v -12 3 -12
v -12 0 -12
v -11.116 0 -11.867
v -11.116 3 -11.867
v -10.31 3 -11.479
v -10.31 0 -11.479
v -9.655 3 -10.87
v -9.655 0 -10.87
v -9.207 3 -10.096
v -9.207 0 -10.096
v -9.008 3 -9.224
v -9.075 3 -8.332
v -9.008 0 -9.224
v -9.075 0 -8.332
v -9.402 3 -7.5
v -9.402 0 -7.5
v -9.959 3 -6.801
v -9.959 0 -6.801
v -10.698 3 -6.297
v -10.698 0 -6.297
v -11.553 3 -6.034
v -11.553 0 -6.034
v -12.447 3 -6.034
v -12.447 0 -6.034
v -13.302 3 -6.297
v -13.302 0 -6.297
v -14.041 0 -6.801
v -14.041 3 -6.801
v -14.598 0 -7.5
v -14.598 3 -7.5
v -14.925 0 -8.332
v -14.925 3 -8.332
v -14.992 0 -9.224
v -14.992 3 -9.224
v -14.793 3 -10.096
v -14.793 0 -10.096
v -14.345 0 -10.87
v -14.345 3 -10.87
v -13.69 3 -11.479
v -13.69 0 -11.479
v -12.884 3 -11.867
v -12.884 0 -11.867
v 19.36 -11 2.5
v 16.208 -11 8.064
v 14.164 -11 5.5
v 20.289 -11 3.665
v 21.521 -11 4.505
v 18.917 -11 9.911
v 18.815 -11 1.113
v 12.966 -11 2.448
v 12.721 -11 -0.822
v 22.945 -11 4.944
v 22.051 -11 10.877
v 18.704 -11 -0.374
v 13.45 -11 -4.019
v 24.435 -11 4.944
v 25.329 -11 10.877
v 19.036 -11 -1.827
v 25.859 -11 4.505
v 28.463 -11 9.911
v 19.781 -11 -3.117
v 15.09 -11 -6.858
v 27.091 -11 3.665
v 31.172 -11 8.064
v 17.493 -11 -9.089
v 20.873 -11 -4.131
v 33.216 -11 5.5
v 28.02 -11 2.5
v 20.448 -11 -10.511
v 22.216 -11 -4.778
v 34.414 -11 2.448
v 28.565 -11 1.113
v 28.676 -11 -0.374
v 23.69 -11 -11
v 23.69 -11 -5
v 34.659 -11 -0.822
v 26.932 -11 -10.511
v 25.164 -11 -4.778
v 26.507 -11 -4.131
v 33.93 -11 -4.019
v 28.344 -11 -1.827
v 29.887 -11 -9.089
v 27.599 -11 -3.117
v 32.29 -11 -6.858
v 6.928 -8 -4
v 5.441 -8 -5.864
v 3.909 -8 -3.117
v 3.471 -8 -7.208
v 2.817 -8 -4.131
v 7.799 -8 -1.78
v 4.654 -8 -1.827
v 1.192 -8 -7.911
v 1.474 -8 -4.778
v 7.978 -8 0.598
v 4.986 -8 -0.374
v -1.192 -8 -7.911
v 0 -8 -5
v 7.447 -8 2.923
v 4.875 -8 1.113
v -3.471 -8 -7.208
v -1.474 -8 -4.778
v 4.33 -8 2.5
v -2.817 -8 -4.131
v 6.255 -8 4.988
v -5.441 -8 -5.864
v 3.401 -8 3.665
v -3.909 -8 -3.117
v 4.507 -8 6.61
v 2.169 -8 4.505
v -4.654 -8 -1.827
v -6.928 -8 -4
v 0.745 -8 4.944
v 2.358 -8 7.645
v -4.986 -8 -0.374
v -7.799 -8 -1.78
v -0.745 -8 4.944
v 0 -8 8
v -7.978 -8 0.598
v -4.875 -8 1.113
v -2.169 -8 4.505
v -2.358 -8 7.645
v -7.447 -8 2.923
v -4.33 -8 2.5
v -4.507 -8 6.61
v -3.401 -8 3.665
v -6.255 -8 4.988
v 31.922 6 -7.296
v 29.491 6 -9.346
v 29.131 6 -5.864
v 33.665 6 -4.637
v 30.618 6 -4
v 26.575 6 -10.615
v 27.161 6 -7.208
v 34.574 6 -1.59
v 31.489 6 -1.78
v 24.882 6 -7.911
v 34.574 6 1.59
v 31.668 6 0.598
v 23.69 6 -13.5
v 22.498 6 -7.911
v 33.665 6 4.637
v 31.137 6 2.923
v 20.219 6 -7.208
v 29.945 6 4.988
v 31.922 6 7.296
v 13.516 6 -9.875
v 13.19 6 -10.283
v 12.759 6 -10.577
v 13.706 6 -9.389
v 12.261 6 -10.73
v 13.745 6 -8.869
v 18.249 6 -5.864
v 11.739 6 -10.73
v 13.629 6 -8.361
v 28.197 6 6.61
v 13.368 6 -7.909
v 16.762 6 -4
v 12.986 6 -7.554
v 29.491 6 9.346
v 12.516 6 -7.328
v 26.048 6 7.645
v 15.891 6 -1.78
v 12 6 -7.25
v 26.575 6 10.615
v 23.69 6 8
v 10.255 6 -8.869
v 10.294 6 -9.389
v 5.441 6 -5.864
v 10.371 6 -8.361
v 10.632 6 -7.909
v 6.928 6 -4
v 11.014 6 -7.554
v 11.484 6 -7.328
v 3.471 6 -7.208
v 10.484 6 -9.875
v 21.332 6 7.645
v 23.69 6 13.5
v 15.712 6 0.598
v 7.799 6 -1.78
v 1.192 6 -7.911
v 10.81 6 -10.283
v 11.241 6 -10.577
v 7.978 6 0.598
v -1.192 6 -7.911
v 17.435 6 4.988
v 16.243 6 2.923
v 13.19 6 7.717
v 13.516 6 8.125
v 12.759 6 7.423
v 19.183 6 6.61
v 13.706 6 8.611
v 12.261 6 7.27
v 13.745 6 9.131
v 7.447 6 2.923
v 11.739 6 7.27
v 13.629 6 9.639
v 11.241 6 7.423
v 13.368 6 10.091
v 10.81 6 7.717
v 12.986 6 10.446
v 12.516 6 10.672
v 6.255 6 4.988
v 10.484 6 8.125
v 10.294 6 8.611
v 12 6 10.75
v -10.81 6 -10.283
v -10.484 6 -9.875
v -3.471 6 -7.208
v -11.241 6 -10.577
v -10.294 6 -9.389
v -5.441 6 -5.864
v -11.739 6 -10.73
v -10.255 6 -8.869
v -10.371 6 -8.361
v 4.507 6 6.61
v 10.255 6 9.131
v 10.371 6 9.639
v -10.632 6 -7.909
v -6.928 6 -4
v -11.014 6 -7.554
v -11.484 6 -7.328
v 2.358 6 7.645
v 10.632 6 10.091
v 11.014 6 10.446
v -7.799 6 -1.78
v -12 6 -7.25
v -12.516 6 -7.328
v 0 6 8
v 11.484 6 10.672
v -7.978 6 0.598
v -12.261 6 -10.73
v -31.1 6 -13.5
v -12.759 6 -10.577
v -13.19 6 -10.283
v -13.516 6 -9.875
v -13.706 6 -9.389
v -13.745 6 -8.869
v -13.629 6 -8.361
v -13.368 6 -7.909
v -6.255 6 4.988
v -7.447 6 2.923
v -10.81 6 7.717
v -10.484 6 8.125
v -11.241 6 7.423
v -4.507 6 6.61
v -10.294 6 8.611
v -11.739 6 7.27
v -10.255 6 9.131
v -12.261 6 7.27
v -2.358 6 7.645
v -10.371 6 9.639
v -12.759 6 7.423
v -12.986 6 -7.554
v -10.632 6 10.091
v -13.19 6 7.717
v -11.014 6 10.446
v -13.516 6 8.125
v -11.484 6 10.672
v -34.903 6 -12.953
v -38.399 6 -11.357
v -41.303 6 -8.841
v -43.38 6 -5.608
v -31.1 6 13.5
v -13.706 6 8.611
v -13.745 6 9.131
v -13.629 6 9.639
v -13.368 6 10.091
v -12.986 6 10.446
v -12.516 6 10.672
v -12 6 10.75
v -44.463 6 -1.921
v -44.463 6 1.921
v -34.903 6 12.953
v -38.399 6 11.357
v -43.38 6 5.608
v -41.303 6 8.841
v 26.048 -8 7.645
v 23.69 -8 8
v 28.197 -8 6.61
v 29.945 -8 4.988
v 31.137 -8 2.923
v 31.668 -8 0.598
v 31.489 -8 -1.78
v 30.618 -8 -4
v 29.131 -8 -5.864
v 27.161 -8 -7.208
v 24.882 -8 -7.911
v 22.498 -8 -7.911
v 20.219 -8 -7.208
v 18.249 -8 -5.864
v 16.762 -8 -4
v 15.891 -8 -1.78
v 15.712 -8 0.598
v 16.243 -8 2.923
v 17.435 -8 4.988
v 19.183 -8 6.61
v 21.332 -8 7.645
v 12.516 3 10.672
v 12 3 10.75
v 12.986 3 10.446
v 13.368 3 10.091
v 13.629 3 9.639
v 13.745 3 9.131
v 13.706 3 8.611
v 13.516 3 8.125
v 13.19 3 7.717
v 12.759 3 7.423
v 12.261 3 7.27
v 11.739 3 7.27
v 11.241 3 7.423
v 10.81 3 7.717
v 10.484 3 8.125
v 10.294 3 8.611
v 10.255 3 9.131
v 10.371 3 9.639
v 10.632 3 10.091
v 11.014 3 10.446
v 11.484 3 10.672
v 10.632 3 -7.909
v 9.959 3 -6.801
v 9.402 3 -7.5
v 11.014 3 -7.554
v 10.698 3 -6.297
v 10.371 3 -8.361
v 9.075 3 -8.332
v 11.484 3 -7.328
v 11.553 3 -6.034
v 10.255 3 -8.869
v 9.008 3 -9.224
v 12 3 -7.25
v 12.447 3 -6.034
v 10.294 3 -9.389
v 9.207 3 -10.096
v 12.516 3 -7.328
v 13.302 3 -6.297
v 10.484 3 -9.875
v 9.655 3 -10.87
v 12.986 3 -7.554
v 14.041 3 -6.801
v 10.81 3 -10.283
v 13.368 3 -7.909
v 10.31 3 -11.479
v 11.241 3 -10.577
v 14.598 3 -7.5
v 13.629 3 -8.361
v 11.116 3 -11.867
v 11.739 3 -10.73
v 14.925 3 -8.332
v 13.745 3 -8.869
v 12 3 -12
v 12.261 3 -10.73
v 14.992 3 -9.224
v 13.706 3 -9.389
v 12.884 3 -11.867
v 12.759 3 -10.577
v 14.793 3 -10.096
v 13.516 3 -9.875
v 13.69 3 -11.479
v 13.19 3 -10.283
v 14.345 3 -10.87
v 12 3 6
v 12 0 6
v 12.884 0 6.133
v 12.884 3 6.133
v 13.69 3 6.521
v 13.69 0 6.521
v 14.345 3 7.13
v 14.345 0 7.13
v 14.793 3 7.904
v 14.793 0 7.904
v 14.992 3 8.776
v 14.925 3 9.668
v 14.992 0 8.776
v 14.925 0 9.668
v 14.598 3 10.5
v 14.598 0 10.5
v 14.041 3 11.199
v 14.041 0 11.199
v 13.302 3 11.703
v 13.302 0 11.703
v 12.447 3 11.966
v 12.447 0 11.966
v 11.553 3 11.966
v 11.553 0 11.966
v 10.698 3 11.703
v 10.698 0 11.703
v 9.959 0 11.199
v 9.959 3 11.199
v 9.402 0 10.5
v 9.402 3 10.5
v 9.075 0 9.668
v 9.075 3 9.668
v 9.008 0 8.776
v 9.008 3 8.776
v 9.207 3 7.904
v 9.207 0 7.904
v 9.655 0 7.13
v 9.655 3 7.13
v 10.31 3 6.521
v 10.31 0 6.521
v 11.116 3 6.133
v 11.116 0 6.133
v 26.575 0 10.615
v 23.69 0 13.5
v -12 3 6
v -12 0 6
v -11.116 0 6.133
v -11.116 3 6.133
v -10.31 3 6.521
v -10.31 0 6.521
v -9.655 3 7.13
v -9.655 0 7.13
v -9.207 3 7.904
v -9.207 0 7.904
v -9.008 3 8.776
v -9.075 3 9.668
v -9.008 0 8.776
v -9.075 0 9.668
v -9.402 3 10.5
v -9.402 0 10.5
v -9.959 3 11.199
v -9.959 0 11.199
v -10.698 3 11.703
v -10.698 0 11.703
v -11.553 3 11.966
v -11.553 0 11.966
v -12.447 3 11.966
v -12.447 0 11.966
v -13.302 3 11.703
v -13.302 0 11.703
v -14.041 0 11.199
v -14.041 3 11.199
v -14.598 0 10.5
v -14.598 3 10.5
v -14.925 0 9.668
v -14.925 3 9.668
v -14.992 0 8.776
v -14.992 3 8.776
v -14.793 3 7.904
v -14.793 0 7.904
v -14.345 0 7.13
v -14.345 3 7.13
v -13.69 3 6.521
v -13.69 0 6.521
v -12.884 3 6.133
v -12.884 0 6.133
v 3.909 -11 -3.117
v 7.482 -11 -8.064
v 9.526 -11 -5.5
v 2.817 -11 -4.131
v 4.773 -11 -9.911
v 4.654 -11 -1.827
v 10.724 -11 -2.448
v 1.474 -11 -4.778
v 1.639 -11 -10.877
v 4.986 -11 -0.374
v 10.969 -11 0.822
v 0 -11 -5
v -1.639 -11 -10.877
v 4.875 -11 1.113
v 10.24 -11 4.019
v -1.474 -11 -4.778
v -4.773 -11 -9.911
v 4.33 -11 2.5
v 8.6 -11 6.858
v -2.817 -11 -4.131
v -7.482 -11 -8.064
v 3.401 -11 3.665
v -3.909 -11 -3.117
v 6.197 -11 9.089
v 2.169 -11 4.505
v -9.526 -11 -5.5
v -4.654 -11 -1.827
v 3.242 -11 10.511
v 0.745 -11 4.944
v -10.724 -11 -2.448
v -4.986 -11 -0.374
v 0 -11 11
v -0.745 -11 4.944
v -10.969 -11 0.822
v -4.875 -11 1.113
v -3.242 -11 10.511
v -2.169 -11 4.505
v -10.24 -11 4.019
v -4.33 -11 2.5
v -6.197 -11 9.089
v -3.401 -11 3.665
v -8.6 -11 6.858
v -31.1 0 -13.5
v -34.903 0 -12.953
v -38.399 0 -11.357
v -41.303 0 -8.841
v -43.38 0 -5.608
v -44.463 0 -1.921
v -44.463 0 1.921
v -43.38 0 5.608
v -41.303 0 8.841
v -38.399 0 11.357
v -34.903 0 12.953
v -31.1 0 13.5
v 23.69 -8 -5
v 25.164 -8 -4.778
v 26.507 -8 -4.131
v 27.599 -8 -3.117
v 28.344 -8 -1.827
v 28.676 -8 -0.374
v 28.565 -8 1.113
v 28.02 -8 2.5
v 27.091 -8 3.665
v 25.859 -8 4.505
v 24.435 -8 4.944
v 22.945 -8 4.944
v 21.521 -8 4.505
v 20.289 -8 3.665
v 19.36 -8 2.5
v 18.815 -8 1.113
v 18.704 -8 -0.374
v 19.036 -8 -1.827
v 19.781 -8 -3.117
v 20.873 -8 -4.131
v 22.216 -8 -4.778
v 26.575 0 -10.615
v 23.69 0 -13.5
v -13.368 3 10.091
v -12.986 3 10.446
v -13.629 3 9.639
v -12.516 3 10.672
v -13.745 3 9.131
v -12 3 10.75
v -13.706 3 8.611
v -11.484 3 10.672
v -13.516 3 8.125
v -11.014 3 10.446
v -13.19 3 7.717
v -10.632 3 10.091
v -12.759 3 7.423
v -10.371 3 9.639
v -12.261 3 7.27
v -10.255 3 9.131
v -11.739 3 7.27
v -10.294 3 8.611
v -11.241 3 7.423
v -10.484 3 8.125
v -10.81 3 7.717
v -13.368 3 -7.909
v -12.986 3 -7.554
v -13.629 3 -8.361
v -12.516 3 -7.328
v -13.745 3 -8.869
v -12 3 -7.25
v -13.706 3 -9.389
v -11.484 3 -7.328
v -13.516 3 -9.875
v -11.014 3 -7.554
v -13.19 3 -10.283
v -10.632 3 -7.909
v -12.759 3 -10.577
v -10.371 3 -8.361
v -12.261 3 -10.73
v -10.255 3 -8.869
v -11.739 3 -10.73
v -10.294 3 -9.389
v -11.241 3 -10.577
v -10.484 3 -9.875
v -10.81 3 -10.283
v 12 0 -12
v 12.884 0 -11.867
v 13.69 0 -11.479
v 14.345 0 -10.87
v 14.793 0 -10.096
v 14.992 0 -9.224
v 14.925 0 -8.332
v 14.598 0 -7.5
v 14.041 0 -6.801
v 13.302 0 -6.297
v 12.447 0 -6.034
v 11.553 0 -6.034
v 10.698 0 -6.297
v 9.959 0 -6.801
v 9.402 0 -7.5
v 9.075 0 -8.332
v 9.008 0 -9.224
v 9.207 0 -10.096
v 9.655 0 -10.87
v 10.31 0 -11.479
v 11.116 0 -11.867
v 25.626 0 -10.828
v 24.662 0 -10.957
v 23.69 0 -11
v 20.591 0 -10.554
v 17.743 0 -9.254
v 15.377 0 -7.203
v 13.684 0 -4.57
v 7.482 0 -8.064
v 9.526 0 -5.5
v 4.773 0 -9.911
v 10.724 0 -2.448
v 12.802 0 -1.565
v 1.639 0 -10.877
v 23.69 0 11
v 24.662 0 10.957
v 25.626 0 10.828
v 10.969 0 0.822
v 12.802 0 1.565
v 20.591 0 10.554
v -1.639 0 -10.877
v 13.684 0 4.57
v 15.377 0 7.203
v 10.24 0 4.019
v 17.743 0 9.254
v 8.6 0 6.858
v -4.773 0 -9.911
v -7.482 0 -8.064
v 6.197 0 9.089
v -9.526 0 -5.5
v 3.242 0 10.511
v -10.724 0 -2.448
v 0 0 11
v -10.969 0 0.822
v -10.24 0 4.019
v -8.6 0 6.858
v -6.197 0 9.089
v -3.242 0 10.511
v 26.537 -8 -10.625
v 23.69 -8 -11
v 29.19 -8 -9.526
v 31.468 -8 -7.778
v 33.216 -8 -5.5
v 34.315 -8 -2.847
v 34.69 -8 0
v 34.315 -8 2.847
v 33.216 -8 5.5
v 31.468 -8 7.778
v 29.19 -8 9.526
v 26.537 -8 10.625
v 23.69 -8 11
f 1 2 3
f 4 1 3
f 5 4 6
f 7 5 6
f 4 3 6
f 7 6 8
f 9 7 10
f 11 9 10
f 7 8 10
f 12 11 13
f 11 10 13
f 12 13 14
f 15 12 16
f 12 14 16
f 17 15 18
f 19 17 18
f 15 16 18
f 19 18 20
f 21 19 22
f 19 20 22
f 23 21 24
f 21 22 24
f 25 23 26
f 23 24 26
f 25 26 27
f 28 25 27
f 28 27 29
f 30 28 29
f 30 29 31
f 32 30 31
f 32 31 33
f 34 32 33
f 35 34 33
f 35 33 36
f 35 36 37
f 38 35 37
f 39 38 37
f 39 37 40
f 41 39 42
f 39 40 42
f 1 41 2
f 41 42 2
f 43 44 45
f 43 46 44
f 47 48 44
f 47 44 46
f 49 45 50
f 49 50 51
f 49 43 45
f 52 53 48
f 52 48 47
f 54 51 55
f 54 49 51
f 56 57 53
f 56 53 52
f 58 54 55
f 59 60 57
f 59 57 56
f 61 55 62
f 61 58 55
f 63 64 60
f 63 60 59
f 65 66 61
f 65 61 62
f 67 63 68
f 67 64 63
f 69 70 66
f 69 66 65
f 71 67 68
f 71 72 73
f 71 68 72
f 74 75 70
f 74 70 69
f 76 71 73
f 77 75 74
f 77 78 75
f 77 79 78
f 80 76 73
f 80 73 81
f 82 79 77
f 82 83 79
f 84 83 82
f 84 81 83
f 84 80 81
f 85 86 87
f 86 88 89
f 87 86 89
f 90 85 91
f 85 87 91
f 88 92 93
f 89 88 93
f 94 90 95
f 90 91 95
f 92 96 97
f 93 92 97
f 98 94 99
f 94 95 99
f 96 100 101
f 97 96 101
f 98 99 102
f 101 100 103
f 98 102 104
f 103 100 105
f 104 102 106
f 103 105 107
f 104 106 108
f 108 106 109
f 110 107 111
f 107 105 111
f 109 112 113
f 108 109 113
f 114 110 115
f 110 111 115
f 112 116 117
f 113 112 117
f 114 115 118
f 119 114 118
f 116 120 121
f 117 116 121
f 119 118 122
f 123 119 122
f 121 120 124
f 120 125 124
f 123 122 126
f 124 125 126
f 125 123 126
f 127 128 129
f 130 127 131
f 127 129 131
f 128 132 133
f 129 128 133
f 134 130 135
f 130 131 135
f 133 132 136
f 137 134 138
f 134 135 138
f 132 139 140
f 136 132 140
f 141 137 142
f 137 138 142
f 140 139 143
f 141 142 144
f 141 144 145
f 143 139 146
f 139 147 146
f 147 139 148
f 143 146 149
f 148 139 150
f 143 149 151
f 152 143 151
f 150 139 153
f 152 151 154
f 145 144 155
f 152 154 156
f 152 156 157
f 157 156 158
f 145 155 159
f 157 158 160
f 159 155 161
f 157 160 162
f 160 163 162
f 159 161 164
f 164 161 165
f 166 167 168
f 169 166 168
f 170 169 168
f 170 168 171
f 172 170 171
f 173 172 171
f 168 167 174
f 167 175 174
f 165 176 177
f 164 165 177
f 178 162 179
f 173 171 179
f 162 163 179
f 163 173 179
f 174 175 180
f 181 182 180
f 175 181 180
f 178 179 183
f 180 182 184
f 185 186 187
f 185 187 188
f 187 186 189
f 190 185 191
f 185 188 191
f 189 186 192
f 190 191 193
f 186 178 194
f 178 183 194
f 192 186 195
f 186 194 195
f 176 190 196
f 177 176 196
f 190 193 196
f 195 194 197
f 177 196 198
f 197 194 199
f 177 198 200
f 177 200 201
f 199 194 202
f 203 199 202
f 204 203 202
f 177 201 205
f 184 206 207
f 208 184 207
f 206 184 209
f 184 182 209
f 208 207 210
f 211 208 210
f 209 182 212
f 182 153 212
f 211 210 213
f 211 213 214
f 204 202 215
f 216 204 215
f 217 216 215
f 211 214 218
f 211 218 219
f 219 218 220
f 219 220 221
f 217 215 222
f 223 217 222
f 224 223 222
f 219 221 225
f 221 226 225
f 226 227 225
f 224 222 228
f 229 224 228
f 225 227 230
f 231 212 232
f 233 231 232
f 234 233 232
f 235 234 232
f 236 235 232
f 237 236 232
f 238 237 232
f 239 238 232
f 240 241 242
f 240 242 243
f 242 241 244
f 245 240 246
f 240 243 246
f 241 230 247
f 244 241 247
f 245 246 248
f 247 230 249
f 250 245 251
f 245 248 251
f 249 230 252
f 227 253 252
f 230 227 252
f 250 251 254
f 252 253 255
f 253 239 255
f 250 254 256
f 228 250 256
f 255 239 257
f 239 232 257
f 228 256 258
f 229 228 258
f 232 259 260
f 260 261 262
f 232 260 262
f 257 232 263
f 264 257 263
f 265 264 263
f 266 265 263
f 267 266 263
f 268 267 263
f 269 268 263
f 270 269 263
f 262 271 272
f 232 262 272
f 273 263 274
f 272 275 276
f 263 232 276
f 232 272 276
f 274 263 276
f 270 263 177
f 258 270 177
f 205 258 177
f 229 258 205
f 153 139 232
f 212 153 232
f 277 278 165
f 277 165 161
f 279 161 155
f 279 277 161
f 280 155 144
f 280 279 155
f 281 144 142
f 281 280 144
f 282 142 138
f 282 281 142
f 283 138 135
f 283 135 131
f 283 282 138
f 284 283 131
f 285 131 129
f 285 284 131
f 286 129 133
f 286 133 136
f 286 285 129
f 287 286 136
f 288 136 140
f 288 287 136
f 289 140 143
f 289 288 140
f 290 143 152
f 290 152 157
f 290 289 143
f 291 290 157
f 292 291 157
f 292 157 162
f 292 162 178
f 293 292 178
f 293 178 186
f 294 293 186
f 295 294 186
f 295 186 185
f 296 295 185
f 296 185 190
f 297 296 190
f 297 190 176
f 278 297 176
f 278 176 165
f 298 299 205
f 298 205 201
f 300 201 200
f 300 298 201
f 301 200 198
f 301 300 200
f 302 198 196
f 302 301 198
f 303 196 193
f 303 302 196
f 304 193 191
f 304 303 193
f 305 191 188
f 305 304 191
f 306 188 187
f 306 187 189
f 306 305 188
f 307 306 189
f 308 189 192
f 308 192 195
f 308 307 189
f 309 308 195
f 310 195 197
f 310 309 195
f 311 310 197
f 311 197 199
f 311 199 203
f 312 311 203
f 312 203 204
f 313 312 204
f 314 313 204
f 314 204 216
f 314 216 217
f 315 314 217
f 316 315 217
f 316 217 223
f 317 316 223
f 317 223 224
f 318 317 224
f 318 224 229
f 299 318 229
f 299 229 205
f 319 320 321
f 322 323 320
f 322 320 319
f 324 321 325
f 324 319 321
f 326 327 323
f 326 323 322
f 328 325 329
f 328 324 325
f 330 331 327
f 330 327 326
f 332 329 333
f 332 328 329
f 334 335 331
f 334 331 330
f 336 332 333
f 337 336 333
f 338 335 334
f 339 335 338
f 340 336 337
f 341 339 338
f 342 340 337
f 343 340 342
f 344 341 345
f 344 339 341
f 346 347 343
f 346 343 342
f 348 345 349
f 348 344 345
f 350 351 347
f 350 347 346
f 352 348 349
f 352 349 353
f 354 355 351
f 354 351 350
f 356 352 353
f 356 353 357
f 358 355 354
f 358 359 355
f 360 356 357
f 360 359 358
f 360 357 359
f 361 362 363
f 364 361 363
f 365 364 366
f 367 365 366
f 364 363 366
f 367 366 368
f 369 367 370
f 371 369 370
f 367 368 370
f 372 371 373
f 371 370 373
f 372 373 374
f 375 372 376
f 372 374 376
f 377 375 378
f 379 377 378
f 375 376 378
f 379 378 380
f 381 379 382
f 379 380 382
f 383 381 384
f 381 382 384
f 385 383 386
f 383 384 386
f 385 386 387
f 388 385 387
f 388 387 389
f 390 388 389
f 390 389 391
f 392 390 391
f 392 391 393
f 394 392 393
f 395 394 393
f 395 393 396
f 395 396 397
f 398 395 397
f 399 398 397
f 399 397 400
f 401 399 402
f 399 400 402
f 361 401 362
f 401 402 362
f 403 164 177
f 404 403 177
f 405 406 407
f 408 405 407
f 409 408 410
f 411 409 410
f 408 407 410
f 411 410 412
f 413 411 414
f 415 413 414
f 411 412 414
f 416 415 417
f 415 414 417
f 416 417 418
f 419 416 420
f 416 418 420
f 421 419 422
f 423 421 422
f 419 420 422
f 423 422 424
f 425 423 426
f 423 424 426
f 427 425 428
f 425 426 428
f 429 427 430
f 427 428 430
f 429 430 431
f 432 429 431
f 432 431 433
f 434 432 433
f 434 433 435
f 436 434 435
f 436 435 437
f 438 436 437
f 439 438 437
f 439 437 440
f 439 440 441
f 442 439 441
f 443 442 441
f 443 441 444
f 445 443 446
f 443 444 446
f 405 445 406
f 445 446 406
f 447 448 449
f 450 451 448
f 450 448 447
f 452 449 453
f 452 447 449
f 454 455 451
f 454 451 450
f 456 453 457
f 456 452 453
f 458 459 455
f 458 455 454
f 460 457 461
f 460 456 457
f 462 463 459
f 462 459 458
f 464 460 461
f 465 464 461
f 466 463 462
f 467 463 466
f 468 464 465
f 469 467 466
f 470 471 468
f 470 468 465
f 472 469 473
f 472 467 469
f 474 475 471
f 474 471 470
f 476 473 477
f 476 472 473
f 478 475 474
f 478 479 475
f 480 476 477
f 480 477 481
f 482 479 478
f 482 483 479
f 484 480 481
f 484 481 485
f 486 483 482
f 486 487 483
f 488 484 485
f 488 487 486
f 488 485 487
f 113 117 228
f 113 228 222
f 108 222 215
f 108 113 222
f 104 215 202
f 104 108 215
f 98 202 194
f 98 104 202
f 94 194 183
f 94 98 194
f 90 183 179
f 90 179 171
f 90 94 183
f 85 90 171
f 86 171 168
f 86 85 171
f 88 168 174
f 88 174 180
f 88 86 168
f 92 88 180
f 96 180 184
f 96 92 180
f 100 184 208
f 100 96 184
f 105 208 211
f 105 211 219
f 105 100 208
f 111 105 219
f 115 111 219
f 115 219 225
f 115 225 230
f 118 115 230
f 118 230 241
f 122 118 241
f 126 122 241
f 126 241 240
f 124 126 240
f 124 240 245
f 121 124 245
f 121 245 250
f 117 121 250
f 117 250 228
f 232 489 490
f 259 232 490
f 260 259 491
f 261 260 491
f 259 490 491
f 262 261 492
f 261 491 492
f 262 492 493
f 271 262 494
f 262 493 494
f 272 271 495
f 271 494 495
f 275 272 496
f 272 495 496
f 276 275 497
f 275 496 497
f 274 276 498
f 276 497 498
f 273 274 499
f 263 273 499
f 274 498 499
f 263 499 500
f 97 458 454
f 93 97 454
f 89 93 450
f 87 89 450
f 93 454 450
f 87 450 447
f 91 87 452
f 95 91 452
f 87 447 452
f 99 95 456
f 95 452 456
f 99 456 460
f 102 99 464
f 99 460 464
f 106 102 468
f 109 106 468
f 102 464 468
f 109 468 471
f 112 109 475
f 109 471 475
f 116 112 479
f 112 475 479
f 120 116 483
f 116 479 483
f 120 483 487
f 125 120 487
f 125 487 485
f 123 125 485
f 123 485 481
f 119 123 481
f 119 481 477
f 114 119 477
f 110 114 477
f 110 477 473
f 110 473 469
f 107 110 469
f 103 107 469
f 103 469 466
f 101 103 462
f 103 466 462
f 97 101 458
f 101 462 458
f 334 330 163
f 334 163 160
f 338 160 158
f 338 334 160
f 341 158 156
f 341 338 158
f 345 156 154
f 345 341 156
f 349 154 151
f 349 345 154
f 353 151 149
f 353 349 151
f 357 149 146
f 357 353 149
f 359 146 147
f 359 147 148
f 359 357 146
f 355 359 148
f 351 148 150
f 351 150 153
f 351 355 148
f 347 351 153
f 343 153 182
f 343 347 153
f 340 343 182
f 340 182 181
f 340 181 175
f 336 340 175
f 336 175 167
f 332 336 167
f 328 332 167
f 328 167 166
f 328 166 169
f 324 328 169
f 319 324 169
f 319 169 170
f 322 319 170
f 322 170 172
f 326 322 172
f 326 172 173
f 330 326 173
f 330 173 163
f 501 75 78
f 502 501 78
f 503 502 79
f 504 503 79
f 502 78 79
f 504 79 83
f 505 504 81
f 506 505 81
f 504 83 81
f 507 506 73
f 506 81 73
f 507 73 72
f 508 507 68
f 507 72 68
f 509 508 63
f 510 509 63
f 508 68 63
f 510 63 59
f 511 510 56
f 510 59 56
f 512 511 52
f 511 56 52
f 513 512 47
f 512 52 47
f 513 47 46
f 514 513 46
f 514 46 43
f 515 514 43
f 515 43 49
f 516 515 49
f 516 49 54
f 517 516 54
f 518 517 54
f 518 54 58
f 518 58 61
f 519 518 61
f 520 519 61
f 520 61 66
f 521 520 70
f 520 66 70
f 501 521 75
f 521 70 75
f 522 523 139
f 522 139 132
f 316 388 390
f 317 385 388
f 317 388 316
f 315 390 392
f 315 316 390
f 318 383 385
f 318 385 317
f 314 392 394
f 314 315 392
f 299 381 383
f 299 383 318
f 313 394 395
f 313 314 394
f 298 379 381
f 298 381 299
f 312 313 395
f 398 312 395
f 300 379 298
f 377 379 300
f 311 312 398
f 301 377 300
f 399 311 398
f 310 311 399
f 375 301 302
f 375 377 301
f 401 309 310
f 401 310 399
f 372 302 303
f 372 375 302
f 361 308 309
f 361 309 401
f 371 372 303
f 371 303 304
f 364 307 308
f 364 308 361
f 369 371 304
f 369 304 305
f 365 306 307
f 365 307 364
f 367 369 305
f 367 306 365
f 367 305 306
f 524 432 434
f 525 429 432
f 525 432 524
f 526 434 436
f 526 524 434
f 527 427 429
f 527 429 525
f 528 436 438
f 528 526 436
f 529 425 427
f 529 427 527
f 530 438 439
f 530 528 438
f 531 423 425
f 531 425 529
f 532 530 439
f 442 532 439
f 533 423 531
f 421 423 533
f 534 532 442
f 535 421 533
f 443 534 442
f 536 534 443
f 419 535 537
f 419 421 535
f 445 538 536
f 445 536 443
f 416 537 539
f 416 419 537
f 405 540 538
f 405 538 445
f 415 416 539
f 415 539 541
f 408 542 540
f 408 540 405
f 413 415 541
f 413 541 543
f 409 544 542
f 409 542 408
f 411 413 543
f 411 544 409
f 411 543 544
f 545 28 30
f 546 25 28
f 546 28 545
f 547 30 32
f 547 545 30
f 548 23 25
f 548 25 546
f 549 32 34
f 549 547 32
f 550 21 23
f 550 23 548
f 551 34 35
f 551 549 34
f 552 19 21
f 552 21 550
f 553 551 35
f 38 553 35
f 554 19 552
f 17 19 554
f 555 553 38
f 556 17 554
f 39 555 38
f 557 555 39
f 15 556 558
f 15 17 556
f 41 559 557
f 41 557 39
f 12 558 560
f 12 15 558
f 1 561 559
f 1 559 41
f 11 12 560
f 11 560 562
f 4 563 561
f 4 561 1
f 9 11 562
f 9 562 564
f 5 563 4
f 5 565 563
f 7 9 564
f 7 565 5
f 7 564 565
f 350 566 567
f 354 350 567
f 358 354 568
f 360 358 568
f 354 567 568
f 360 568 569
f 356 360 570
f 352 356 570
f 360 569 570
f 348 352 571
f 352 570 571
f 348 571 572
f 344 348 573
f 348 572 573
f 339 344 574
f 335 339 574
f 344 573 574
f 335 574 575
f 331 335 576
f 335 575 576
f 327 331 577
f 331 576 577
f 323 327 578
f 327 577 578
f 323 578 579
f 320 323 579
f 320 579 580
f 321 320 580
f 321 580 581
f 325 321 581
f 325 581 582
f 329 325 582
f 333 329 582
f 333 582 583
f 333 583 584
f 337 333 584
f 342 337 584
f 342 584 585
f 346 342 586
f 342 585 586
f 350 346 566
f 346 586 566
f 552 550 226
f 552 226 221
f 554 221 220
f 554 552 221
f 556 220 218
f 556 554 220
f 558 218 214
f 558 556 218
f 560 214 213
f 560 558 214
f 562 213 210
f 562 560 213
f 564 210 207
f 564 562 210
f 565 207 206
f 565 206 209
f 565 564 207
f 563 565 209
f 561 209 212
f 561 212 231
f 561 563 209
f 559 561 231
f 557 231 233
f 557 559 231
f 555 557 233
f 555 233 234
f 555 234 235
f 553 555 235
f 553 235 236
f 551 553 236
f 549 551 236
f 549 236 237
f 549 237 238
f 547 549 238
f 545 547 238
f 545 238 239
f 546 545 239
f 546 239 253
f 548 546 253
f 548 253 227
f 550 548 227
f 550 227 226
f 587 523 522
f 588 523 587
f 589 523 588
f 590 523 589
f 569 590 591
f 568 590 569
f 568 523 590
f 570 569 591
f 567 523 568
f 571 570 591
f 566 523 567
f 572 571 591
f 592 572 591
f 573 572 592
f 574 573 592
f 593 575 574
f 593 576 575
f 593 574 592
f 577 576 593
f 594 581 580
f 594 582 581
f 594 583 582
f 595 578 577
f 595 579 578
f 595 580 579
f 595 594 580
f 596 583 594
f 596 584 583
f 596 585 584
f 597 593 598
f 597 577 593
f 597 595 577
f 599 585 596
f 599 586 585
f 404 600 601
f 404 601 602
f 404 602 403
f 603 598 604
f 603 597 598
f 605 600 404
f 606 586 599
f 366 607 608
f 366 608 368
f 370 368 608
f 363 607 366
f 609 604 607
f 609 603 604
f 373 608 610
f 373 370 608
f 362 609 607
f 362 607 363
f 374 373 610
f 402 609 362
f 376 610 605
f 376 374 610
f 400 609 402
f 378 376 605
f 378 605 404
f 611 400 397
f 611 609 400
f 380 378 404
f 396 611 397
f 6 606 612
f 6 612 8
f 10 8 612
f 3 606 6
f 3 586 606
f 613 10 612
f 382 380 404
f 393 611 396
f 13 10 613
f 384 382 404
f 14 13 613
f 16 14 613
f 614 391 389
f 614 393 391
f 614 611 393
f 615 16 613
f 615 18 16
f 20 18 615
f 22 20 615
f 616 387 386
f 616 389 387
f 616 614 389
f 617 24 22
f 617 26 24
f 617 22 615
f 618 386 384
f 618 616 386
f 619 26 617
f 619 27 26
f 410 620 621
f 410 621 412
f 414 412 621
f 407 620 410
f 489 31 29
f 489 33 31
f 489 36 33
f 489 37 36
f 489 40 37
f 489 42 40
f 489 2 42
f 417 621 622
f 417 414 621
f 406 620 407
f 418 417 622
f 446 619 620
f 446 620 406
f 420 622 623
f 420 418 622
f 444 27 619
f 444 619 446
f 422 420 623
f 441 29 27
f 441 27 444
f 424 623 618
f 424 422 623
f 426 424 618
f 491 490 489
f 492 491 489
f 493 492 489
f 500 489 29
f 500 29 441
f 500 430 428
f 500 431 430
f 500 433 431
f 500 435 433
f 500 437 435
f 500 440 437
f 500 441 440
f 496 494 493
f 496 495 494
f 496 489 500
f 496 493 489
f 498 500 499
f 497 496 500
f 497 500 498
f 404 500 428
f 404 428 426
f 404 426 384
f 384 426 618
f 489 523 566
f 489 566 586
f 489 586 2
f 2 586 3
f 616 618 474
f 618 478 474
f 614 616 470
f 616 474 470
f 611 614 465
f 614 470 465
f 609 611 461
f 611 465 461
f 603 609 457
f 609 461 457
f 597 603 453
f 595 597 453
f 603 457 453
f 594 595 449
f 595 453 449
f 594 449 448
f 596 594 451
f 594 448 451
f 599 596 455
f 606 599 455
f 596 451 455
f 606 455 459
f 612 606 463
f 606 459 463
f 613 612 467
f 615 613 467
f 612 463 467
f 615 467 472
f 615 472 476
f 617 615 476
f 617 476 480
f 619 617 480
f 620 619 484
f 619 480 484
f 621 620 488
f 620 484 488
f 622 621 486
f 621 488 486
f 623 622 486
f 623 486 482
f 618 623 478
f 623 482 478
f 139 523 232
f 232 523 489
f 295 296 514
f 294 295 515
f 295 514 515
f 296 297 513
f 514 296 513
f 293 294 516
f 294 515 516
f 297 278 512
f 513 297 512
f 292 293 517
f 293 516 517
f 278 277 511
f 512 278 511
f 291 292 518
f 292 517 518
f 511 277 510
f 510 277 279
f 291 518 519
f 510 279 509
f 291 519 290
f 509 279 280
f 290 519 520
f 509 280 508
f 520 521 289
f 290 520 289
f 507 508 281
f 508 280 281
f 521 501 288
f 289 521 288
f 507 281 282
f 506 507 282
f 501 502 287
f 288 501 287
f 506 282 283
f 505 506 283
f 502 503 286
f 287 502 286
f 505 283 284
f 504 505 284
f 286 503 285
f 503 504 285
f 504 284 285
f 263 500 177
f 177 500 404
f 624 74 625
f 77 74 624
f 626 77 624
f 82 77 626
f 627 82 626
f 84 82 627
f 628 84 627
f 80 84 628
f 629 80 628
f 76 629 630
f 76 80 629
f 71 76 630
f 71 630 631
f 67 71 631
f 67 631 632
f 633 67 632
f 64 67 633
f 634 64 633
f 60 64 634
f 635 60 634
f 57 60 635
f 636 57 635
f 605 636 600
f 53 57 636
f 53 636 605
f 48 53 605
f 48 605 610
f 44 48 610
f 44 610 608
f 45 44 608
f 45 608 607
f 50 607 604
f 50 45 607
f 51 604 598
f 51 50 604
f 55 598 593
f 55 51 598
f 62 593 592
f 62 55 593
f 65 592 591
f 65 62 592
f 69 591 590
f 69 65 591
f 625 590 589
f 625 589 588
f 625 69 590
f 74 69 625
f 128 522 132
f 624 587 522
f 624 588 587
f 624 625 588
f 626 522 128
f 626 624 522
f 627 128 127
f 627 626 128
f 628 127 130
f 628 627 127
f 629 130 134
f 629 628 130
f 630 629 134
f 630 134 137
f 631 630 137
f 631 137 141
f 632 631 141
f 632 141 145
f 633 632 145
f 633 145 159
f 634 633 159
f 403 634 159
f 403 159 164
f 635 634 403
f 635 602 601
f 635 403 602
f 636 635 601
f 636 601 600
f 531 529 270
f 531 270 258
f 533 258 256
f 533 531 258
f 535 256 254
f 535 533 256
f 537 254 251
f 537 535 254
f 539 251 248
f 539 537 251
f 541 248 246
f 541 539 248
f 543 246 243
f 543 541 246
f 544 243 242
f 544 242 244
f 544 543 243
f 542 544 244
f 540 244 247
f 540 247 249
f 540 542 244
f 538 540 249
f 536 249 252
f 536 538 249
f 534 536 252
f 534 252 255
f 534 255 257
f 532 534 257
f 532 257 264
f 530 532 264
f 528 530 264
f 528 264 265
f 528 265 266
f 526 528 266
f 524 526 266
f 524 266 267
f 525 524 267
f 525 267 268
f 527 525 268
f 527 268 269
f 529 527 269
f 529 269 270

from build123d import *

# Parameters (mm, degrees)
SKETCH1_R               = 1.75
SKETCH1_R_2             = 5
BOSS_EXTRUDE1_DEPTH     = 6
SKETCH2_R               = 3
SKETCH2_R_2             = 1.75
CUT_EXTRUDE1_DEPTH      = 3
CUT_EXTRUDE2_START      = -3
SKETCH3_R               = 8
SKETCH3_R_2             = 5
CUT_EXTRUDE2_DEPTH      = 3
SKETCH5_R               = 13.5
BOSS_EXTRUDE2_DEPTH     = 6
CUT_EXTRUDE3_DEPTH      = 47.983082062
CUT_EXTRUDE3_DEPTH_BACK = 47.983082062
SKETCH6_R               = 8
BOSS_EXTRUDE6_START     = -8
SKETCH9_R               = 11
SKETCH9_R_2             = 8
BOSS_EXTRUDE6_DEPTH     = 8
BOSS_EXTRUDE7_START     = 3
SKETCH10_R              = 11
SKETCH10_R_2            = 5
BOSS_EXTRUDE7_DEPTH     = 3
CHAMFER3_SIZE           = 2.5


with BuildPart() as part:
    # Sketch1 → Boss-Extrude1 (new body)
    with BuildSketch(Plane(origin=(0, 0, 0), x_dir=(1, 0, 0), z_dir=(0, 1, 0))):
        with BuildLine():
            Line((23.69, 13.5), (-31.1, 13.5))
            Line((-31.1, 13.5), (-31.1, 10.5))
            ThreePointArc((-31.1, 10.5), (-20.6, 0), (-31.1, -10.5))
            Line((-31.1, -10.5), (-31.1, -13.5))
            Line((-31.1, -13.5), (23.69, -13.5))
            Line((23.69, -13.5), (23.69, -11))
            ThreePointArc((23.69, -11), (34.69, 0), (23.69, 11))
            Line((23.69, 11), (23.69, 13.5))
        make_face()
        with Locations(Location((-12, -9, 0), (0, 0, 270))):
            Circle(SKETCH1_R, mode=Mode.SUBTRACT)
        with Locations(Location((12, -9, 0), (0, 0, 270))):
            Circle(SKETCH1_R, mode=Mode.SUBTRACT)
        with Locations(Location((-12, 9, 0), (0, 0, 270))):
            Circle(SKETCH1_R, mode=Mode.SUBTRACT)
        with Locations(Location((0, 0, 0), (0, 0, 270))):
            Circle(SKETCH1_R_2, mode=Mode.SUBTRACT)
        with Locations(Location((12, 9, 0), (0, 0, 270))):
            Circle(SKETCH1_R, mode=Mode.SUBTRACT)
        with Locations(Location((23.69, 0, 0), (0, 0, 270))):
            Circle(SKETCH1_R_2, mode=Mode.SUBTRACT)
    extrude(amount=BOSS_EXTRUDE1_DEPTH)

    # Sketch2 → Cut-Extrude1 (cut)
    # profile 1 of 4: a face of its own
    with BuildSketch(Plane.XZ):
        with Locations(Location((-12, -9, 0), (0, 0, 270))):
            Circle(SKETCH2_R)
        with Locations(Location((-12, -9, 0), (0, 0, 270))):
            Circle(SKETCH2_R_2, mode=Mode.SUBTRACT)
    # profile 2 of 4: a face of its own
    with BuildSketch(Plane.XZ):
        with Locations(Location((-12, 9, 0), (0, 0, 270))):
            Circle(SKETCH2_R)
        with Locations(Location((-12, 9, 0), (0, 0, 270))):
            Circle(SKETCH2_R_2, mode=Mode.SUBTRACT)
    # profile 3 of 4: a face of its own
    with BuildSketch(Plane.XZ):
        with Locations(Location((12, 9, 0), (0, 0, 270))):
            Circle(SKETCH2_R)
        with Locations(Location((12, 9, 0), (0, 0, 270))):
            Circle(SKETCH2_R_2, mode=Mode.SUBTRACT)
    # profile 4 of 4: a face of its own
    with BuildSketch(Plane.XZ):
        with Locations(Location((12, -9, 0), (0, 0, 270))):
            Circle(SKETCH2_R)
        with Locations(Location((12, -9, 0), (0, 0, 270))):
            Circle(SKETCH2_R_2, mode=Mode.SUBTRACT)
    extrude(amount=-CUT_EXTRUDE1_DEPTH, mode=Mode.SUBTRACT)

    # Sketch3 → Cut-Extrude2 (cut)
    # profile 1 of 2: a face of its own
    with BuildSketch(Plane(origin=(0, 6, 0), x_dir=(1, 0, 0), z_dir=(0, 1, 0)).offset(CUT_EXTRUDE2_START)):
        with Locations(Location((0, 0, 0), (0, 0, 270))):
            Circle(SKETCH3_R)
        with Locations(Location((0, 0, 0), (0, 0, 270))):
            Circle(SKETCH3_R_2, mode=Mode.SUBTRACT)
    # profile 2 of 2: a face of its own
    with BuildSketch(Plane(origin=(0, 6, 0), x_dir=(1, 0, 0), z_dir=(0, 1, 0)).offset(CUT_EXTRUDE2_START)):
        with Locations(Location((23.69, 0, 0), (0, 0, 270))):
            Circle(SKETCH3_R)
        with Locations(Location((23.69, 0, 0), (0, 0, 270))):
            Circle(SKETCH3_R_2, mode=Mode.SUBTRACT)
    extrude(amount=CUT_EXTRUDE2_DEPTH, mode=Mode.SUBTRACT)

    # Sketch5 → Boss-Extrude2 (add)
    with BuildSketch(Plane(origin=(0, 0, 0), x_dir=(1, 0, 0), z_dir=(0, 1, 0))):
        with Locations((-31.1, 0)):
            Circle(SKETCH5_R)
    extrude(amount=BOSS_EXTRUDE2_DEPTH)

    # Sketch6 → Cut-Extrude3 (cut, two sides: drawn at the far end of the back side and taken through both)
    with BuildSketch(Plane(origin=(0, 6, 0), x_dir=(1, 0, 0), z_dir=(0, 1, 0)).offset(-CUT_EXTRUDE3_DEPTH_BACK)):
        with Locations(Location((0, 0, 0), (0, 0, 270))):
            Circle(SKETCH6_R)
        with Locations(Location((23.69, 0, 0), (0, 0, 270))):
            Circle(SKETCH6_R)
    extrude(amount=CUT_EXTRUDE3_DEPTH + CUT_EXTRUDE3_DEPTH_BACK, mode=Mode.SUBTRACT)

    # Sketch9 → Boss-Extrude6 (add)
    # profile 1 of 2: a face of its own
    with BuildSketch(Plane(origin=(0, 0, 0), x_dir=(1, 0, 0), z_dir=(0, 1, 0)).offset(BOSS_EXTRUDE6_START)):
        with Locations(Location((0, 0, 0), (0, 0, 270))):
            Circle(SKETCH9_R)
        with Locations(Location((0, 0, 0), (0, 0, 270))):
            Circle(SKETCH9_R_2, mode=Mode.SUBTRACT)
    # profile 2 of 2: a face of its own
    with BuildSketch(Plane(origin=(0, 0, 0), x_dir=(1, 0, 0), z_dir=(0, 1, 0)).offset(BOSS_EXTRUDE6_START)):
        with BuildLine():
            ThreePointArc((23.69, 11), (12.69, 0), (23.69, -11))
            ThreePointArc((23.69, -11), (31.468174593, -7.778174593), (34.69, 0))
            ThreePointArc((34.69, 0), (31.468174593, 7.778174593), (23.69, 11))
        make_face()
        with Locations(Location((23.69, 0, 0), (0, 0, 270))):
            Circle(SKETCH9_R_2, mode=Mode.SUBTRACT)
    extrude(amount=BOSS_EXTRUDE6_DEPTH)

    # Sketch10 → Boss-Extrude7 (add)
    # profile 1 of 2: a face of its own
    with BuildSketch(Plane.XZ.offset(8).offset(BOSS_EXTRUDE7_START)):
        with Locations(Location((23.69, 0, 0), (0, 0, 270))):
            Circle(SKETCH10_R)
        with Locations(Location((23.69, 0, 0), (0, 0, 270))):
            Circle(SKETCH10_R_2, mode=Mode.SUBTRACT)
    # profile 2 of 2: a face of its own
    with BuildSketch(Plane.XZ.offset(8).offset(BOSS_EXTRUDE7_START)):
        with Locations(Location((0, 0, 0), (0, 0, 90))):
            Circle(SKETCH10_R)
        with Locations(Location((0, 0, 0), (0, 0, 270))):
            Circle(SKETCH10_R_2, mode=Mode.SUBTRACT)
    extrude(amount=-BOSS_EXTRUDE7_DEPTH)

    # Chamfer3
    # the kernel refuses this chamfer: 2.5 mm, written as the material it adds along each edge
    with BuildSketch(Plane(origin=(23.69, 0, 11), x_dir=(0.9912092295509808, 0, -0.13230367815352337), z_dir=(0, 1, 0))) as chamfer3_piece_1_section:
        with BuildLine():
            Line((2.910680919, 0), (-CHAMFER3_SIZE * 0.132303678154, -CHAMFER3_SIZE * 0.991209229551))
            Line((-CHAMFER3_SIZE * 0.132303678154, -CHAMFER3_SIZE * 0.991209229551), (0, 0))
            ThreePointArc((0, 0), (1.49552658, -0.096625069), (2.910680919, 0))
        make_face()
    chamfer3_piece_1 = extrude(amount=6, mode=Mode.PRIVATE)
    chamfer3_piece_1 = split(chamfer3_piece_1, bisect_by=Plane(origin=(23.69, 0, 13.5), z_dir=(0, 0, -1)), keep=Keep.TOP, mode=Mode.PRIVATE)
    add(chamfer3_piece_1)
    with BuildSketch(Plane(origin=(23.69, 0, -11), x_dir=(0, 0, -1), z_dir=(0, 1, 0))) as chamfer3_piece_2_section:
        with BuildLine():
            Line((CHAMFER3_SIZE, 0), (-0.385093792, -2.885093792))
            ThreePointArc((-0.385093792, -2.885093792), (-0.102088007, -1.495163601), (0, 0))
            Line((0, 0), (CHAMFER3_SIZE, 0))
        make_face()
    chamfer3_piece_2 = extrude(amount=6, mode=Mode.PRIVATE)
    chamfer3_piece_2 = split(chamfer3_piece_2, bisect_by=Plane(origin=(23.69, 0, -13.5), z_dir=(0, 0, 1)), keep=Keep.TOP, mode=Mode.PRIVATE)
    add(chamfer3_piece_2)


solid = part.part
